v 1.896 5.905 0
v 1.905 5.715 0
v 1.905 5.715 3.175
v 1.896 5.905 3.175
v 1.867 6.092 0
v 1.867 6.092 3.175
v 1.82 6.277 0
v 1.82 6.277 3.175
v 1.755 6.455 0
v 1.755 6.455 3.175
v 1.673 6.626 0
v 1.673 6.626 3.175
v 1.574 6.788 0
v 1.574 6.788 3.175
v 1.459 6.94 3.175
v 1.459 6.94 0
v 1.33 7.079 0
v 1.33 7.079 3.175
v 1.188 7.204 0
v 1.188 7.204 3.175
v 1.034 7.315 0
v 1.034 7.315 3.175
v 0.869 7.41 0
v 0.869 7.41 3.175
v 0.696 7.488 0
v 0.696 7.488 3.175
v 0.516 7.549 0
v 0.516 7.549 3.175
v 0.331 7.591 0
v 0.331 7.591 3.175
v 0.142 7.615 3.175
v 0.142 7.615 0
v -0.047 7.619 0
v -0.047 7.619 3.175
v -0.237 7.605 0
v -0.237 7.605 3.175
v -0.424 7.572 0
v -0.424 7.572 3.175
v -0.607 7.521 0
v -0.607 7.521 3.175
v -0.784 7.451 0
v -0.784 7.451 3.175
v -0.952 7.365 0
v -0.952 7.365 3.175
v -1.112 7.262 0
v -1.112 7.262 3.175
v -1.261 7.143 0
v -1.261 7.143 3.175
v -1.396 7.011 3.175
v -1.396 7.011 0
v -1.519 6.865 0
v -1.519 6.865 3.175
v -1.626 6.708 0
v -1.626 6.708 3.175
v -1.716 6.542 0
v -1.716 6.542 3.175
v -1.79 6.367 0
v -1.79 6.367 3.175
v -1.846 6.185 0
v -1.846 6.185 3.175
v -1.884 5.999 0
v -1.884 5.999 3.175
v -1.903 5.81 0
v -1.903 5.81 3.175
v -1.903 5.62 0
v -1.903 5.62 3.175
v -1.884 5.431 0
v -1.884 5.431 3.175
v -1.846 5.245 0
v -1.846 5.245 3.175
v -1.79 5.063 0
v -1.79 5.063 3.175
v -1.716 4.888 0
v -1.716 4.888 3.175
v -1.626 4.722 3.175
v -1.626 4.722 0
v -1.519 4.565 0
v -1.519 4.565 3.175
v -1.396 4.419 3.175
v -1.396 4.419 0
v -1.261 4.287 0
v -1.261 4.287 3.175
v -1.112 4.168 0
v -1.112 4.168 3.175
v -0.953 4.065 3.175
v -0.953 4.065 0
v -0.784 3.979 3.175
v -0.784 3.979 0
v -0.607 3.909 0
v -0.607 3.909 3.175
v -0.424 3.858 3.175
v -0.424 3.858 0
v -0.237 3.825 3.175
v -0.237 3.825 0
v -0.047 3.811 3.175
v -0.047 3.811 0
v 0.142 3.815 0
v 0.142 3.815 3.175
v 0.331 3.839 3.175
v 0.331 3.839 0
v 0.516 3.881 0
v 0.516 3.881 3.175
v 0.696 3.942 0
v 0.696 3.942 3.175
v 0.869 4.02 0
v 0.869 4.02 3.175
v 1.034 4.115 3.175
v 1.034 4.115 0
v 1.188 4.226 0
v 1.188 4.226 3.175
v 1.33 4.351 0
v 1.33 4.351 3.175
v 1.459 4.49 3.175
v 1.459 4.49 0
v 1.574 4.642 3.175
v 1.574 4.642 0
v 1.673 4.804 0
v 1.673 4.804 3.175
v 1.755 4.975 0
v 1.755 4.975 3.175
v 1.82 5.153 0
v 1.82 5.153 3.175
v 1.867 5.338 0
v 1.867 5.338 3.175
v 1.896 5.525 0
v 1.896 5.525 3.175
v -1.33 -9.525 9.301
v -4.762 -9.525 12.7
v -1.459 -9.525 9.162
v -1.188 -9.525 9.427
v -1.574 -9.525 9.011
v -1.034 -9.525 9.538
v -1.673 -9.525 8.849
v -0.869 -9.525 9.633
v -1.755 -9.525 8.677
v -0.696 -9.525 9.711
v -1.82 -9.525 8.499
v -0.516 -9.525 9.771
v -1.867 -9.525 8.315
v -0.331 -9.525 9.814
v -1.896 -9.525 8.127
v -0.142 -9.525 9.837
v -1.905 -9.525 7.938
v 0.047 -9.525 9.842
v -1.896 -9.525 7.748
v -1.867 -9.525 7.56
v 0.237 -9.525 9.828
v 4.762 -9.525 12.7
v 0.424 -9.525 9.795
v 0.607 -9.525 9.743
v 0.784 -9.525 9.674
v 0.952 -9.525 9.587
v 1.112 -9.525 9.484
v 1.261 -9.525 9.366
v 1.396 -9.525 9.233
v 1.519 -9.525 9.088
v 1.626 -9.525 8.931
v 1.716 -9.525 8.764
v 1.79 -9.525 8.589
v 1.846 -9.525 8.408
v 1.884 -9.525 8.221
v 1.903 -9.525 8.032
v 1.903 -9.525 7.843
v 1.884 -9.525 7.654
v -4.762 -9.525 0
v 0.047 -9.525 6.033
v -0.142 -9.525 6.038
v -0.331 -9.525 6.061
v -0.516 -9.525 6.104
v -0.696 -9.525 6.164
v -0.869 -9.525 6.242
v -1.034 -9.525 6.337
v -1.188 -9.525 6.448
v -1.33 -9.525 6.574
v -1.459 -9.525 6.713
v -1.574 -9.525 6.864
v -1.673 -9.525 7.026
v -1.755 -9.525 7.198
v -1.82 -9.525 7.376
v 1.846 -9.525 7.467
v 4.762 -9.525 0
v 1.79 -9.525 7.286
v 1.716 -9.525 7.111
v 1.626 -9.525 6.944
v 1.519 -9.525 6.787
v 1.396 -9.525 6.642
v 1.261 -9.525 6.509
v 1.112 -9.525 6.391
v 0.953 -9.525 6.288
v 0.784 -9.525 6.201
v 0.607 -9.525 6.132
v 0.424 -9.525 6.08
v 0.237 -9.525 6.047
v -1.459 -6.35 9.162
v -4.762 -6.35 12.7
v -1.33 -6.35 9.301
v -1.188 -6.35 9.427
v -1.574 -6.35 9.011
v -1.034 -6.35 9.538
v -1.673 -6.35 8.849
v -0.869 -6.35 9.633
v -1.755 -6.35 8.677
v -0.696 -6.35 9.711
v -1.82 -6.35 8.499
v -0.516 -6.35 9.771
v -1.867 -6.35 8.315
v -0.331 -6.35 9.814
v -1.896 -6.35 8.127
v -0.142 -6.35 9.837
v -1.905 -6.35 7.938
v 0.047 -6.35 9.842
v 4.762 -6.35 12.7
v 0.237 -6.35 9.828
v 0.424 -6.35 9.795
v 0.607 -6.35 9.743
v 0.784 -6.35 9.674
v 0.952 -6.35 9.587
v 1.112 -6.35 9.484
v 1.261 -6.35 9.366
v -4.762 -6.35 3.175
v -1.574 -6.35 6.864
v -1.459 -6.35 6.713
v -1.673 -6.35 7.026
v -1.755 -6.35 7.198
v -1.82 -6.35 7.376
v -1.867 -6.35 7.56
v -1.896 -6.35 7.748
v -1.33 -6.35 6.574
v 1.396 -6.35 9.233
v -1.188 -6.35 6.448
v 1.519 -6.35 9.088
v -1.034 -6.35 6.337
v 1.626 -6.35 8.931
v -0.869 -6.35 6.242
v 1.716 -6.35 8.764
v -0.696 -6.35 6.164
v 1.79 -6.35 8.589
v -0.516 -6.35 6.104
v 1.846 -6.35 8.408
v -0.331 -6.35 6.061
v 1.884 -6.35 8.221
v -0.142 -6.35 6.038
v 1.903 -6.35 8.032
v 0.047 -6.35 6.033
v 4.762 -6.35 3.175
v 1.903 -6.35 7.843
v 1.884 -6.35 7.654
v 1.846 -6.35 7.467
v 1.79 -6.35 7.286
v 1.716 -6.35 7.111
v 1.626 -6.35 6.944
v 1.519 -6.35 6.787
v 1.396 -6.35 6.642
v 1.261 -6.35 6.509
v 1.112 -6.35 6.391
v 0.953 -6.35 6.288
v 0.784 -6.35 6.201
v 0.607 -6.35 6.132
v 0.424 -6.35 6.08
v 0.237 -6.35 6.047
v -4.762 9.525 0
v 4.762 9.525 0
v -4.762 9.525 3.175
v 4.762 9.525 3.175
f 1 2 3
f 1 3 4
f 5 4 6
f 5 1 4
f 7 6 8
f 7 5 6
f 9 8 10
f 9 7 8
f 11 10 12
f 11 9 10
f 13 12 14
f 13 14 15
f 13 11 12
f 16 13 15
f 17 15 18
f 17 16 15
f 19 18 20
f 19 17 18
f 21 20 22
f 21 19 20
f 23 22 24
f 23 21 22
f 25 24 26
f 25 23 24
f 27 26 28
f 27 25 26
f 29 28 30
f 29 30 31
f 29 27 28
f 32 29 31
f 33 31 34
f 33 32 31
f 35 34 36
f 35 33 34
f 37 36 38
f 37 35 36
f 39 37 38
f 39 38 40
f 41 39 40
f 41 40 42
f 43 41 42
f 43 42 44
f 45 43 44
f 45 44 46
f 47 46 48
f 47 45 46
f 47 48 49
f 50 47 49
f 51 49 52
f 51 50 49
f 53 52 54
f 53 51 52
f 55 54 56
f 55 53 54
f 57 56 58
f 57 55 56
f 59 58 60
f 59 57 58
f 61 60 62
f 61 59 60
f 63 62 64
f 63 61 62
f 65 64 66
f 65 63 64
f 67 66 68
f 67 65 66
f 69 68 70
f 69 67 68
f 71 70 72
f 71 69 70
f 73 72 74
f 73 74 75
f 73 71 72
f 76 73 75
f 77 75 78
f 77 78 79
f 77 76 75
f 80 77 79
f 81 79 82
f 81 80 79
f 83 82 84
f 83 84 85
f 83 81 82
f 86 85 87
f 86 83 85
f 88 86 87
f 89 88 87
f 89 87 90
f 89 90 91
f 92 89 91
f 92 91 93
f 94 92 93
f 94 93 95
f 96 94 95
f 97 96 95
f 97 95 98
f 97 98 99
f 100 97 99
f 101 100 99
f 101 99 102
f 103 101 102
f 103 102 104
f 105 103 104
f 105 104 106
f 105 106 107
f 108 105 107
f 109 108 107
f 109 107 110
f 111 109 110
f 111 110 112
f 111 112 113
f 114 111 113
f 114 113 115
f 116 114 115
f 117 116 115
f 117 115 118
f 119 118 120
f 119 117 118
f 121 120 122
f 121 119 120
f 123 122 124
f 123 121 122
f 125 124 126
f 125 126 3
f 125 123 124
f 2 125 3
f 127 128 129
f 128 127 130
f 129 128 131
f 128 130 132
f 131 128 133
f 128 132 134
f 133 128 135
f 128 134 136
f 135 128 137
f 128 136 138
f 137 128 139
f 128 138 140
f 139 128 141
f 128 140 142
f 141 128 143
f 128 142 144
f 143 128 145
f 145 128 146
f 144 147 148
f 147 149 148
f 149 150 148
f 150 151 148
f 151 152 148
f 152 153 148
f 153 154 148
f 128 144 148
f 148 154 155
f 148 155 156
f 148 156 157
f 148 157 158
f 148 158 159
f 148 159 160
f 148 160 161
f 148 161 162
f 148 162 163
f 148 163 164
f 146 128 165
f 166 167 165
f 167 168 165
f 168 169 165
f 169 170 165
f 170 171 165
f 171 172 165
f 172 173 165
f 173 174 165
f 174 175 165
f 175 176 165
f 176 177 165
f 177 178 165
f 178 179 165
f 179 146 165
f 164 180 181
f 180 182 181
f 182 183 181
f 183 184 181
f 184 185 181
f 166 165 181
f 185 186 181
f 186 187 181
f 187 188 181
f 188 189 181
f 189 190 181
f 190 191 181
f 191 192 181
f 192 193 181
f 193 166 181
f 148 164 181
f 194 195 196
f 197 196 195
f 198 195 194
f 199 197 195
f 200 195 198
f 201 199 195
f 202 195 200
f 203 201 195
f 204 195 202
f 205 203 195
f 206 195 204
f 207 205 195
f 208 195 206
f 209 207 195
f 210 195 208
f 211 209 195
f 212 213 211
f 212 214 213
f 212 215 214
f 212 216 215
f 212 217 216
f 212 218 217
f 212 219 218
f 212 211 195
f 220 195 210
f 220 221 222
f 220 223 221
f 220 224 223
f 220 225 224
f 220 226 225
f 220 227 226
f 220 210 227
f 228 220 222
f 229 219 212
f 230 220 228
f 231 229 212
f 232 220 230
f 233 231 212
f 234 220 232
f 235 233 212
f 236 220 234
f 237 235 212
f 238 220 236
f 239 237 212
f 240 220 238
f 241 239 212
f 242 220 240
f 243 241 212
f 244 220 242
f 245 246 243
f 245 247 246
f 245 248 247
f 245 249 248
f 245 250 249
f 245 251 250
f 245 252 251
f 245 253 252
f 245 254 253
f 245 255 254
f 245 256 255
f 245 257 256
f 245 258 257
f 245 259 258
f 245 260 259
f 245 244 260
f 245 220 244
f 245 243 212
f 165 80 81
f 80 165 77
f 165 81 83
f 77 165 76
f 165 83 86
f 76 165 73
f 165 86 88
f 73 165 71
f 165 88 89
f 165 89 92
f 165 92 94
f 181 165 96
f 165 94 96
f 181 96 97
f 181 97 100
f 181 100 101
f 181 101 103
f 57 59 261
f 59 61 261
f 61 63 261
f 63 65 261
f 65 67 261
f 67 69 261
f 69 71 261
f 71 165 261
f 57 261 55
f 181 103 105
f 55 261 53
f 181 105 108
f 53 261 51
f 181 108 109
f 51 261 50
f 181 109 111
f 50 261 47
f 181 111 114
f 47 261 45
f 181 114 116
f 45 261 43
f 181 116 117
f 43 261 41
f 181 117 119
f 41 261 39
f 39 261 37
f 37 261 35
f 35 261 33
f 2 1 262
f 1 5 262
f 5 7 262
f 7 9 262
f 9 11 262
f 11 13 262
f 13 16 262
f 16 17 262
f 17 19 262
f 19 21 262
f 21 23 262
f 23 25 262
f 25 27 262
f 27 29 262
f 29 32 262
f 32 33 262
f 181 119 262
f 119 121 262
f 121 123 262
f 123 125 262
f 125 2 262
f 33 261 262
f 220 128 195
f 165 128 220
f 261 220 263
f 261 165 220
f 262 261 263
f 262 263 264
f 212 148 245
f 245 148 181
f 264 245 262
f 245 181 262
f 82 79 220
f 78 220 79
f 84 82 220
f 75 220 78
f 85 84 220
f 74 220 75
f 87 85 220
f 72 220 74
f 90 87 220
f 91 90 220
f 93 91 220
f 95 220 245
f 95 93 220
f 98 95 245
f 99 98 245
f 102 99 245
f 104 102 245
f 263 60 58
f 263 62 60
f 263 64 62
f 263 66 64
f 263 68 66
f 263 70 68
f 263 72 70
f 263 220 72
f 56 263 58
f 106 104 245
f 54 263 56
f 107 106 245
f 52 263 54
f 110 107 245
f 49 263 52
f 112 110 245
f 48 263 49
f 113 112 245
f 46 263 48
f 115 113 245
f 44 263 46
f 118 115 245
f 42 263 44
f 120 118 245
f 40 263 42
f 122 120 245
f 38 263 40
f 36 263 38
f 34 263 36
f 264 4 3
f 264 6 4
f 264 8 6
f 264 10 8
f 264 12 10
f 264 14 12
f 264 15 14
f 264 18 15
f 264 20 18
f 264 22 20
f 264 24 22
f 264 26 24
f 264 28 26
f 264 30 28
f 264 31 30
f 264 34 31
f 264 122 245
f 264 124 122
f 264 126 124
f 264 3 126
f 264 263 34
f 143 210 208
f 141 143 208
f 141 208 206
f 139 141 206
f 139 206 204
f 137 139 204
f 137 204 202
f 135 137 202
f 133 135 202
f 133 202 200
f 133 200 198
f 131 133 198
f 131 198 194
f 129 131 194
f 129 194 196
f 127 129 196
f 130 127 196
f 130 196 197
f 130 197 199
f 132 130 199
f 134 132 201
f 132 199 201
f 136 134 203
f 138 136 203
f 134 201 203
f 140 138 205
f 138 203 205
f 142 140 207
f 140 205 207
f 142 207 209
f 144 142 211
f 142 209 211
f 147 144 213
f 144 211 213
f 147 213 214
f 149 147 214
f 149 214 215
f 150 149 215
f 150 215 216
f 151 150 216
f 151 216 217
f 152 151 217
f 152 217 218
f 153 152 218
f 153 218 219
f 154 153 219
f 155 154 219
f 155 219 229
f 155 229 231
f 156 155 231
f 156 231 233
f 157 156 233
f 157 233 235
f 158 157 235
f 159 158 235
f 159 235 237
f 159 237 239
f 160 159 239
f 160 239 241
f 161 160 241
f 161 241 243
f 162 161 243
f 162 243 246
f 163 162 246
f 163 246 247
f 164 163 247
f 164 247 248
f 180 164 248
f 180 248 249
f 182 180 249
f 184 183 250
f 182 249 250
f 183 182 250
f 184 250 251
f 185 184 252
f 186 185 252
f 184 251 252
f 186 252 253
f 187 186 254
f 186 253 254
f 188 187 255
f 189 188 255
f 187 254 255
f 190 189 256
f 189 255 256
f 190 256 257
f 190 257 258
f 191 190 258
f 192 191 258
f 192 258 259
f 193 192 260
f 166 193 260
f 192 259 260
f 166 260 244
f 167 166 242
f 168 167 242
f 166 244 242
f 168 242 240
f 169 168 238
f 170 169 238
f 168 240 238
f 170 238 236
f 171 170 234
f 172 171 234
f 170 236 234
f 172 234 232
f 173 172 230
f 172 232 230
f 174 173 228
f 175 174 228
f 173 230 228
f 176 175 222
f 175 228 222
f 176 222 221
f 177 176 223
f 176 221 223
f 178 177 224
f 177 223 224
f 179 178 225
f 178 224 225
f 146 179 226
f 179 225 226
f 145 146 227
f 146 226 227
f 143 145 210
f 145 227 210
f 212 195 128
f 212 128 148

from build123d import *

# Parameters (mm, degrees)
F0_W     = 9.525
F0_H     = 15.875
F0_R     = 1.905
F1_DEPTH = 3.175
F0_H_2   = 3.175
F2_DEPTH = 12.7
F3_R     = 1.905
F4_DEPTH = 25.4


with BuildPart() as f1:
    # F0 (on Top) → F1 (new body)
    with BuildSketch(Plane.XY):
        with Locations((0, 1.5875)):
            Rectangle(F0_W, F0_H)
        with Locations((0, 5.715)):
            Circle(F0_R, mode=Mode.SUBTRACT)
    extrude(amount=F1_DEPTH)

    # F0 (on Top) → F2 (join)
    with BuildSketch(Plane.XY):
        with Locations((0, -7.9375)):
            Rectangle(F0_W, F0_H_2)
    extrude(amount=F2_DEPTH)

    # F3 (on face) → F4 (cut)
    with BuildSketch(Plane(origin=(0, -6.35, 0), x_dir=(-1, 0, 0), z_dir=(0, 1, 0))):
        with Locations((0, 7.9375)):
            Circle(F3_R)
    extrude(amount=-F4_DEPTH, mode=Mode.SUBTRACT)


solid = f1.part
